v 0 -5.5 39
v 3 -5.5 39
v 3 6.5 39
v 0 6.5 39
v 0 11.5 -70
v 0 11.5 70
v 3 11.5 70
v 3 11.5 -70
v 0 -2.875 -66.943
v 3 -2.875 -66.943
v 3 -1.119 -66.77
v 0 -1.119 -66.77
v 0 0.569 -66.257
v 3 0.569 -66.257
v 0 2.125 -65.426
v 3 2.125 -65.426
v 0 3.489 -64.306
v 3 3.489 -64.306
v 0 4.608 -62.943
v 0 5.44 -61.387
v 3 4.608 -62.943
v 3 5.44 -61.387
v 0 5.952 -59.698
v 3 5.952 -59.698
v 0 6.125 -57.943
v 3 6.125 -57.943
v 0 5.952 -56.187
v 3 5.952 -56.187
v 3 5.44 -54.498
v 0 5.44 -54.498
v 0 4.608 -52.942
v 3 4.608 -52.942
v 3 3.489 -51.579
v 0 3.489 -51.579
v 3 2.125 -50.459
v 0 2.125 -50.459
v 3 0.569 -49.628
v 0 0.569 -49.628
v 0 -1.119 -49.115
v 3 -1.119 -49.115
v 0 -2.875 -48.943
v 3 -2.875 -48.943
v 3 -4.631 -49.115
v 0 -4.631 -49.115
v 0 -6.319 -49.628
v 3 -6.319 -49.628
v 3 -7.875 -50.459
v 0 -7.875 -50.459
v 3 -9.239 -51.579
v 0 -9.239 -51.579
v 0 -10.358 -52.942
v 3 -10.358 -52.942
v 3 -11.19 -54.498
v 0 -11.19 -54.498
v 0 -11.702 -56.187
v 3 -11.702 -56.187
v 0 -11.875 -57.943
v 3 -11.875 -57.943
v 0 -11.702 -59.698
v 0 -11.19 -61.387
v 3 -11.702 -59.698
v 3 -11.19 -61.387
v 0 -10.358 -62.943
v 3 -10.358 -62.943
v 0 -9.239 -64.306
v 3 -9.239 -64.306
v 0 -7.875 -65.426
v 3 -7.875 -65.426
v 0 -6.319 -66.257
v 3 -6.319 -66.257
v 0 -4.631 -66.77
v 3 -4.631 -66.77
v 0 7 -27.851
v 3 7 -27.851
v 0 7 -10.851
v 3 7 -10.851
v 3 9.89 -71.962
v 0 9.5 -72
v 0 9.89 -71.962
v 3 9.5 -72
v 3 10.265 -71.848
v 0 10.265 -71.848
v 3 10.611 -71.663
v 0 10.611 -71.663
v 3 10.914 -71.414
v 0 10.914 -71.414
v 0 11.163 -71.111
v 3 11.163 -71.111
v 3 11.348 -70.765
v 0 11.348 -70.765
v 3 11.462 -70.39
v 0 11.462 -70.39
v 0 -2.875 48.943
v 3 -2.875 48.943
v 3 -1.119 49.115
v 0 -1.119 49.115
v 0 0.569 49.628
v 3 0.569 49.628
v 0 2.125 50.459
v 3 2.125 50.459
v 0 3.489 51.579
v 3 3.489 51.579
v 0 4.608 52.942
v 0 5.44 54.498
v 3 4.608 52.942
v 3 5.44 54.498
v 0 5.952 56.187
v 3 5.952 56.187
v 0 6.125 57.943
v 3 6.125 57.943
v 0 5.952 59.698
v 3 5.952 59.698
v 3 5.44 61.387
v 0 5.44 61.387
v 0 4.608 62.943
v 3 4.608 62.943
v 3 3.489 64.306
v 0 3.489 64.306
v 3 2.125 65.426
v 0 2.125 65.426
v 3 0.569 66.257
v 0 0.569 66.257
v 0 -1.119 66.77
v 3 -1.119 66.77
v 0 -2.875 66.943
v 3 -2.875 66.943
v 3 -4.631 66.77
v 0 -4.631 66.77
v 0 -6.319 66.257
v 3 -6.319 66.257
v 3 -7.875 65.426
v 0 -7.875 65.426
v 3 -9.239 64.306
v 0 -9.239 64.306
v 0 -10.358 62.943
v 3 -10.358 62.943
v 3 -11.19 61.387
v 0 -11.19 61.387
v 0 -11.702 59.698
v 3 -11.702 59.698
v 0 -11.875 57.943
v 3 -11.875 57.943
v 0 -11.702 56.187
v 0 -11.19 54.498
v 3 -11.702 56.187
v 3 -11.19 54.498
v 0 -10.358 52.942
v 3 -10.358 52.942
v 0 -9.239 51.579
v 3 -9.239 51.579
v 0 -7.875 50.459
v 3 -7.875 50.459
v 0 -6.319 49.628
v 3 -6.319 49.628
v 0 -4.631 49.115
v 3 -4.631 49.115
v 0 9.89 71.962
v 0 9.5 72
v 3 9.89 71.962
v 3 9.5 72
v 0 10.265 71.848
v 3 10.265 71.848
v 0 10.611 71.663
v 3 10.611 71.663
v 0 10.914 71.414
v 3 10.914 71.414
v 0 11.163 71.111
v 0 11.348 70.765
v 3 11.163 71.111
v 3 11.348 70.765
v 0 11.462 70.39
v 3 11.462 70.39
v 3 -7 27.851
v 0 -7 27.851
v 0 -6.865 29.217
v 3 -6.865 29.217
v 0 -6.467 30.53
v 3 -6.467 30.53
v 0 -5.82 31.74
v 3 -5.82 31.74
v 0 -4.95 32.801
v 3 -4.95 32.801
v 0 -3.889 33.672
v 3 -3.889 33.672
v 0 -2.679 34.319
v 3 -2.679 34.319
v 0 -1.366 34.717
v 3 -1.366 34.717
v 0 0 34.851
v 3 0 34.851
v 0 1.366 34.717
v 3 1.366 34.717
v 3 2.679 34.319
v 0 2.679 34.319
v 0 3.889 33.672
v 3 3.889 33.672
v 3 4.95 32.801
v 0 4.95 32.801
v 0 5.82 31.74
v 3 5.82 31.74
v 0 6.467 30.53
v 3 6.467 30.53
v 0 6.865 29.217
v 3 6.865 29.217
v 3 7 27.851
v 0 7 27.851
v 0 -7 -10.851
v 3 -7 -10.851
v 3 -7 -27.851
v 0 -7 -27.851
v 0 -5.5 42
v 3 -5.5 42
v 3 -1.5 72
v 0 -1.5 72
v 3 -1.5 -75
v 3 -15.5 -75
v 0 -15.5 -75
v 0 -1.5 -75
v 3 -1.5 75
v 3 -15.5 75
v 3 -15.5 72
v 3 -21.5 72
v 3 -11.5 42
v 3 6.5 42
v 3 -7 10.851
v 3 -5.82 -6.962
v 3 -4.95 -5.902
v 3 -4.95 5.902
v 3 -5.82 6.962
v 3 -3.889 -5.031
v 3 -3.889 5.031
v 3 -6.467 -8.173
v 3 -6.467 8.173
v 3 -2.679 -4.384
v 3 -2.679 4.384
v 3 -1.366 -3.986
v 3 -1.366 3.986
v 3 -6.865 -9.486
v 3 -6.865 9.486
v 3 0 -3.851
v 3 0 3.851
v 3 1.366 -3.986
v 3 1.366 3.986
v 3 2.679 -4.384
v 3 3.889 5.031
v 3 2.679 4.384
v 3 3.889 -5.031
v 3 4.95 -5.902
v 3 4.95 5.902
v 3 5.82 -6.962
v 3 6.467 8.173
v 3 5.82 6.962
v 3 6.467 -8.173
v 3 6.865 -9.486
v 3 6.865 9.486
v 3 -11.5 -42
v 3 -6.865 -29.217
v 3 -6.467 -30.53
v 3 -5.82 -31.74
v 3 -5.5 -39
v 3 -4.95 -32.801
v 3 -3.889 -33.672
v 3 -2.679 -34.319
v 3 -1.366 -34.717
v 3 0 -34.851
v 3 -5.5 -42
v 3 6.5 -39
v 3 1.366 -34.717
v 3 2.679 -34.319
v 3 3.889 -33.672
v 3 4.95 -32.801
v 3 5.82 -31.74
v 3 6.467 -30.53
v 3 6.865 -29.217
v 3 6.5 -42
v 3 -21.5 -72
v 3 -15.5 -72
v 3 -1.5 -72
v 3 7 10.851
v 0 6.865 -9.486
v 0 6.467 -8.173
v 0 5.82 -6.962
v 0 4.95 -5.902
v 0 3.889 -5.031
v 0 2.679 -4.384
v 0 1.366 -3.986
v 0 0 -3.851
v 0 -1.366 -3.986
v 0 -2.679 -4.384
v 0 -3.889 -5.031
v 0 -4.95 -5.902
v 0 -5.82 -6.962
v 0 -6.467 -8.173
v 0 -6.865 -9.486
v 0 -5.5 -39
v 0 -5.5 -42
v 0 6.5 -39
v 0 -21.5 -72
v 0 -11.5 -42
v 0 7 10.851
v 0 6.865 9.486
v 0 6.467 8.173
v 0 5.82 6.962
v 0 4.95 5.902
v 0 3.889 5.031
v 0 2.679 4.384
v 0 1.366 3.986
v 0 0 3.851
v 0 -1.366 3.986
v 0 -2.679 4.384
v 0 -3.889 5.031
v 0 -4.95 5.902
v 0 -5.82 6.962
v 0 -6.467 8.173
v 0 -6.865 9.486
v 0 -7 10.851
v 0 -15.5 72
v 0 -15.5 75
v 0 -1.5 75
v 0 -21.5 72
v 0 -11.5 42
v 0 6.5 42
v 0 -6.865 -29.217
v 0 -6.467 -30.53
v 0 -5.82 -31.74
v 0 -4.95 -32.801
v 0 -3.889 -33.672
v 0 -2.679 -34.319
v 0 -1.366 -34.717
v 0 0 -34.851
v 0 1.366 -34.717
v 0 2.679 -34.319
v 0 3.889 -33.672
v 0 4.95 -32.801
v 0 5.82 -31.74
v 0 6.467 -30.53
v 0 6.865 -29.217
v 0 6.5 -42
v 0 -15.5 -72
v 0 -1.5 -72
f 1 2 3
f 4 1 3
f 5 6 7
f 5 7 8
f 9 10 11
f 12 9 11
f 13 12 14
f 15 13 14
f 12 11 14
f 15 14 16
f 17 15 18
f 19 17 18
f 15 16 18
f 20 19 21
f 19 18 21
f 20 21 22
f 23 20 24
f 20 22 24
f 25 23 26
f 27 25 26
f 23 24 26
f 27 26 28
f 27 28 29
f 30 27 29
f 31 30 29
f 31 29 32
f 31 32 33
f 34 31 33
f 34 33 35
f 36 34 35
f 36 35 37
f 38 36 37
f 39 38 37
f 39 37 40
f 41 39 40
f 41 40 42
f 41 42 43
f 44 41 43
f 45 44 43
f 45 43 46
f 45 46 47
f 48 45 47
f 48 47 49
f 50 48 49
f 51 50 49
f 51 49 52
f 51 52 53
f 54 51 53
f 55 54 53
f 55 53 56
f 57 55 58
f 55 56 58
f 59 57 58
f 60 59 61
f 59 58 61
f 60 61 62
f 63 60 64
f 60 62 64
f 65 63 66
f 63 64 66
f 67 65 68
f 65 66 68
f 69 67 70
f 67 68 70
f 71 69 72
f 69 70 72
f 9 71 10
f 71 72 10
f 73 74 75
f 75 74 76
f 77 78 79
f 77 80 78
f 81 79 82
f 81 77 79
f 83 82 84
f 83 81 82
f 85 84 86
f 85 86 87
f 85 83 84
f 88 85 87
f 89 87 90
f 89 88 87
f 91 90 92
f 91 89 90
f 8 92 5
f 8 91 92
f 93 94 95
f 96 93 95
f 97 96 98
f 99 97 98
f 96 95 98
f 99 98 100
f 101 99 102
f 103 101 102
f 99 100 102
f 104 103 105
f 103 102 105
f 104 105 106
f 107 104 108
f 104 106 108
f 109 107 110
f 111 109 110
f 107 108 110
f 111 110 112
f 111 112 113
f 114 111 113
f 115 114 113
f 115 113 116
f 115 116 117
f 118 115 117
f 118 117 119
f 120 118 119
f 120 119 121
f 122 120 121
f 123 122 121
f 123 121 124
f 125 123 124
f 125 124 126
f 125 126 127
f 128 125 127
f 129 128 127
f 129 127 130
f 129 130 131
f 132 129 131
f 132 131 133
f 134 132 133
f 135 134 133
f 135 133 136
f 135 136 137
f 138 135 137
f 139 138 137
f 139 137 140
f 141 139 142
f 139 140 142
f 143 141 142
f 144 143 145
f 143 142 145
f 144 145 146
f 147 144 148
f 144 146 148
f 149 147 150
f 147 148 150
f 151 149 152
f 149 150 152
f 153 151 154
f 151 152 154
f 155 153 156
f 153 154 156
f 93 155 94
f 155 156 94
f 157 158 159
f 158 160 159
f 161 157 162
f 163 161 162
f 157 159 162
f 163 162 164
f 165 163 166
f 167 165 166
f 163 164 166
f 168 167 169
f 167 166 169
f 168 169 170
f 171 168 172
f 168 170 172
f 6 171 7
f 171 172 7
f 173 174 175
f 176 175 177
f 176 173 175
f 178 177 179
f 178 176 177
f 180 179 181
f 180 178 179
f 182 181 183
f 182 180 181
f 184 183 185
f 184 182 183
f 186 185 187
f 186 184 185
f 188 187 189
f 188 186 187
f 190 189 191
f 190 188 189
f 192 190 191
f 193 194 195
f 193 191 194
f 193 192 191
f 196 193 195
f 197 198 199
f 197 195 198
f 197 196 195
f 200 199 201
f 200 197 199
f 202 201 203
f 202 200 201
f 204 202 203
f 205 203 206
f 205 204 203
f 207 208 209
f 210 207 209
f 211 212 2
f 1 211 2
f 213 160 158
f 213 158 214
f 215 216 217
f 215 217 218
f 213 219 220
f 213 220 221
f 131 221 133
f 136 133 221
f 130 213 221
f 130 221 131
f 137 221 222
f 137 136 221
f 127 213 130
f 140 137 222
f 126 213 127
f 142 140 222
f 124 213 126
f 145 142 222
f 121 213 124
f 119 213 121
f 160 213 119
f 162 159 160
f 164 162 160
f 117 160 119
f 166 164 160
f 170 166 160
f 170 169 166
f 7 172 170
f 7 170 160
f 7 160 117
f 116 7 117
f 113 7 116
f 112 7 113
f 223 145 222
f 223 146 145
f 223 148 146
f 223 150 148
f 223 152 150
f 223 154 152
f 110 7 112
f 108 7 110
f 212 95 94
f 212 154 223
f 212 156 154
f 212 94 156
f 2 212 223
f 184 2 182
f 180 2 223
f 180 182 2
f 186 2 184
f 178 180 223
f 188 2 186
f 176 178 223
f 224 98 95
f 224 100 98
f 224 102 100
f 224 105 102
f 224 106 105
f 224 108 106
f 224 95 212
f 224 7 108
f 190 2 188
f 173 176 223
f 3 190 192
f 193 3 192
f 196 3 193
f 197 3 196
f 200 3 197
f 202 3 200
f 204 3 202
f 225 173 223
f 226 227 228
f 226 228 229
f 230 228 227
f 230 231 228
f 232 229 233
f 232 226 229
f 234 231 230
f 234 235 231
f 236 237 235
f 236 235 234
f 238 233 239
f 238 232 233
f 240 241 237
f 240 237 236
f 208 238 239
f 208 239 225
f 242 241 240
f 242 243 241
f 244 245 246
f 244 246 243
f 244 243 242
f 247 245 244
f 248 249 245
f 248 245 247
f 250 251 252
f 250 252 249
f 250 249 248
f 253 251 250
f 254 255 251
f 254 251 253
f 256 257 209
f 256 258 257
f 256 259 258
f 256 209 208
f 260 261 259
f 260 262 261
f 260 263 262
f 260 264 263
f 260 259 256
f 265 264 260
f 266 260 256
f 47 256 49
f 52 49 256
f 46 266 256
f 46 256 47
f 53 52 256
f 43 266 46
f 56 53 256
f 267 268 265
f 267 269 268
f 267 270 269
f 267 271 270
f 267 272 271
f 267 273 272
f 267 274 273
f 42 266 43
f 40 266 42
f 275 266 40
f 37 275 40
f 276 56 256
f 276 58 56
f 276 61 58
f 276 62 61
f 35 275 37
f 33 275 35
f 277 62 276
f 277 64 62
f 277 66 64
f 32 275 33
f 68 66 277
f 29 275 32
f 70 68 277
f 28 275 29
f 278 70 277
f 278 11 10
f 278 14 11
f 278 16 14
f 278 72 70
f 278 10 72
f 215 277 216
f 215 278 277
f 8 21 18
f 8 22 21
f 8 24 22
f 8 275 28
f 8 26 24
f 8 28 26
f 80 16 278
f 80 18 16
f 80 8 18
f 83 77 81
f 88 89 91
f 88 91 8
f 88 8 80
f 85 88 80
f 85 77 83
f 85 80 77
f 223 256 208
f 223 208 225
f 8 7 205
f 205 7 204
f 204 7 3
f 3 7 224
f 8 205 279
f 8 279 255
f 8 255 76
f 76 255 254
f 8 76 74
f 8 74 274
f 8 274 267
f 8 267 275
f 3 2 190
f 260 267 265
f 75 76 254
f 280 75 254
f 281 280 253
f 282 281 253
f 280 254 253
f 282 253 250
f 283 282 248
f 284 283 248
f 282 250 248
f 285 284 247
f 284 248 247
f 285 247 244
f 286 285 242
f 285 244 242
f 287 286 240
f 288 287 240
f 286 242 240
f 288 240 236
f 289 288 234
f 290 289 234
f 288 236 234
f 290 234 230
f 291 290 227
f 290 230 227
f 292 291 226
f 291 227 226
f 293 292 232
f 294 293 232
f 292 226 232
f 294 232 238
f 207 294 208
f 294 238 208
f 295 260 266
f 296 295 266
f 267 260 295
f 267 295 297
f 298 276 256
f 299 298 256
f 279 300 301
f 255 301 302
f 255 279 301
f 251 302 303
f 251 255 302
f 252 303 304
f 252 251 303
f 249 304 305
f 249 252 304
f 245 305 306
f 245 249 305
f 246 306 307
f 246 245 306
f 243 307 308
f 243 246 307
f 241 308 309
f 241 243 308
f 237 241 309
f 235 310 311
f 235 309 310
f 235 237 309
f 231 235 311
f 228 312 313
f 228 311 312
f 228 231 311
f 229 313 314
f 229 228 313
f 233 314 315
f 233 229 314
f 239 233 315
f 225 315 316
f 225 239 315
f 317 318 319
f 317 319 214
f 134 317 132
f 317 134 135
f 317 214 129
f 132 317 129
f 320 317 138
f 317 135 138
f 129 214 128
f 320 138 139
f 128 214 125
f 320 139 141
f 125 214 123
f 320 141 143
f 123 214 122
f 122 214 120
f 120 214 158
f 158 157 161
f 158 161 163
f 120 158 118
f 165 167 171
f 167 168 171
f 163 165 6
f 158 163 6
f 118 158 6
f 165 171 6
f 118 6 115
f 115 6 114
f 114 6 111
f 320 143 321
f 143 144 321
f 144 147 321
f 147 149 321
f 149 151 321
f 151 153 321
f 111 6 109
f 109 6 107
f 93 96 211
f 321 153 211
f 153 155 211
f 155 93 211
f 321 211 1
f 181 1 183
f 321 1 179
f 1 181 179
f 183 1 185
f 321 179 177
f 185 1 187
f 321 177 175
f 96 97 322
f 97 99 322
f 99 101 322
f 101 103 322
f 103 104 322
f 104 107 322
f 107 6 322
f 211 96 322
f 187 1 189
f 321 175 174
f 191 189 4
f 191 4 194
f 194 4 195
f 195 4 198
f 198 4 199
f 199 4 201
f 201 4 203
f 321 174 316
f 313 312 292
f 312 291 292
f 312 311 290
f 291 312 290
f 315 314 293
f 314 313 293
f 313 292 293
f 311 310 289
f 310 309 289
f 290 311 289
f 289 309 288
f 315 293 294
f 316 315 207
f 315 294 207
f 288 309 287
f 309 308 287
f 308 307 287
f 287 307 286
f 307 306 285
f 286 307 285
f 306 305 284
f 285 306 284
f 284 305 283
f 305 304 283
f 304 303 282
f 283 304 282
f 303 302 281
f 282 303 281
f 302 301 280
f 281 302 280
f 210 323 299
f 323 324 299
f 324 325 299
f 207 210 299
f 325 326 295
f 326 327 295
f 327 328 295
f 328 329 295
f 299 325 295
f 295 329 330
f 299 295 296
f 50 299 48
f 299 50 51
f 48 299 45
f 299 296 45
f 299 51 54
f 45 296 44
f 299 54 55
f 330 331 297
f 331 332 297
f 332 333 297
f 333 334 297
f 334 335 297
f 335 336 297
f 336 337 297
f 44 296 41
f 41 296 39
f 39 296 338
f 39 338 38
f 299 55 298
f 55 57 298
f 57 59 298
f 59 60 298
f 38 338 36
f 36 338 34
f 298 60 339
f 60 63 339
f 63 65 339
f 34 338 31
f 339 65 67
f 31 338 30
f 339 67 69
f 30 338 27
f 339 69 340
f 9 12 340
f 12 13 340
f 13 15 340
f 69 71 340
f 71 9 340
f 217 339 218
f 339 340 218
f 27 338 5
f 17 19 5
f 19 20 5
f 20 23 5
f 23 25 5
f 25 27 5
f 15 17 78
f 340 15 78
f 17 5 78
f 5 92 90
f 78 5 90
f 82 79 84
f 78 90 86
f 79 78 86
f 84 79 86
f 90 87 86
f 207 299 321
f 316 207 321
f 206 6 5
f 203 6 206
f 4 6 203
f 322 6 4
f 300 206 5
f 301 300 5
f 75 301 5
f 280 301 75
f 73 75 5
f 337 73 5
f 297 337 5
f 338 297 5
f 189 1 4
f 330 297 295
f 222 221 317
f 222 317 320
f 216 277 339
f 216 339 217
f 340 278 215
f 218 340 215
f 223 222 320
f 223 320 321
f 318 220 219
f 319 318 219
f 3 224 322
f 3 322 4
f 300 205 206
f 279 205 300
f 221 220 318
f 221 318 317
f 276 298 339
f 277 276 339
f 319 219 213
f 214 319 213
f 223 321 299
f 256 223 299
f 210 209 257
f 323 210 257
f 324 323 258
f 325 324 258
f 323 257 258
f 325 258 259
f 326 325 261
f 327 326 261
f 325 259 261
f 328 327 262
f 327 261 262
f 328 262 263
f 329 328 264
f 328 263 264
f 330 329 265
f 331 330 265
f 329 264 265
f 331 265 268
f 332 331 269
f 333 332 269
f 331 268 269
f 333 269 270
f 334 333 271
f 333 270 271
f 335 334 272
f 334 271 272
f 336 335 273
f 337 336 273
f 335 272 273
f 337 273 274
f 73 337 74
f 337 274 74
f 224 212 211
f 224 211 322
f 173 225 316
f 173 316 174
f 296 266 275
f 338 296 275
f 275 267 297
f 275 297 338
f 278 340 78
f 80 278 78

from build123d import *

# Parameters (mm, degrees)
SKETCH1_W           = 144
SKETCH1_H           = 23
BOSS_EXTRUDE1_DEPTH = 3
FILLET1_R           = 2
BOSS_EXTRUDE2_DEPTH = 3
SKETCH3_W           = 3
SKETCH3_H           = 14
BOSS_EXTRUDE3_DEPTH = 3
SKETCH4_R           = 9
SKETCH4_W           = 3
SKETCH4_H           = 12
CUT_EXTRUDE1_DEPTH  = 10


with BuildPart() as part:
    # Sketch1 → Boss-Extrude1 (new body)
    with BuildSketch(Plane(origin=(0, 0, 0), x_dir=(0, 0, -1), z_dir=(1, 0, 0))):
        Rectangle(SKETCH1_W, SKETCH1_H)
    extrude(amount=BOSS_EXTRUDE1_DEPTH)

    # Fillet1
    fillet1_edges = [part.edges().sort_by_distance(p)[0] for p in [
        (1.5, 11.5, 72),
        (1.5, 11.5, -72),
    ]]
    fillet(fillet1_edges, radius=FILLET1_R)

    # Sketch2 → Boss-Extrude2 (add)
    with BuildSketch(Plane(origin=(3, 0, 0), x_dir=(0, 0, -1), z_dir=(1, 0, 0))):
        Polygon((-72, -11.5), (-72, -21.5), (-42, -11.5), align=None)
        Polygon((72, -11.5), (72, -21.5), (42, -11.5), align=None)
    extrude(amount=-BOSS_EXTRUDE2_DEPTH)

    # Sketch3 → Boss-Extrude3 (add)
    with BuildSketch(Plane(origin=(3, 0, 0), x_dir=(0, 0, -1), z_dir=(1, 0, 0))):
        with Locations((-73.5, -8.5)):
            Rectangle(SKETCH3_W, SKETCH3_H)
        with Locations((73.5, -8.5)):
            Rectangle(SKETCH3_W, SKETCH3_H)
    extrude(amount=-BOSS_EXTRUDE3_DEPTH)

    # Sketch4 → Cut-Extrude1 (cut)
    with BuildSketch(Plane(origin=(3, 0, 0), x_dir=(0, 0, -1), z_dir=(1, 0, 0))):
        with Locations((-57.942503038, -2.875250136)):
            Circle(SKETCH4_R)
        with Locations((57.942503038, -2.875250136)):
            Circle(SKETCH4_R)
        with Locations((-40.5, 0.5)):
            Rectangle(SKETCH4_W, SKETCH4_H)
        with Locations((40.5, 0.5)):
            Rectangle(SKETCH4_W, SKETCH4_H)
        with BuildLine():
            Line((-27.851450915, 7), (-10.851450915, 7))
            ThreePointArc((-10.851450915, 7), (-3.851450915, 0), (-10.851450915, -7))
            Line((-10.851450915, -7), (-27.851450915, -7))
            ThreePointArc((-27.851450915, -7), (-34.851450915, 0), (-27.851450915, 7))
        make_face()
        with BuildLine():
            Line((27.851450915, 7), (10.851450915, 7))
            ThreePointArc((10.851450915, 7), (3.851450915, 0), (10.851450915, -7))
            Line((10.851450915, -7), (27.851450915, -7))
            ThreePointArc((27.851450915, -7), (34.851450915, 0), (27.851450915, 7))
        make_face()
    extrude(amount=-CUT_EXTRUDE1_DEPTH, mode=Mode.SUBTRACT)


solid = part.part
